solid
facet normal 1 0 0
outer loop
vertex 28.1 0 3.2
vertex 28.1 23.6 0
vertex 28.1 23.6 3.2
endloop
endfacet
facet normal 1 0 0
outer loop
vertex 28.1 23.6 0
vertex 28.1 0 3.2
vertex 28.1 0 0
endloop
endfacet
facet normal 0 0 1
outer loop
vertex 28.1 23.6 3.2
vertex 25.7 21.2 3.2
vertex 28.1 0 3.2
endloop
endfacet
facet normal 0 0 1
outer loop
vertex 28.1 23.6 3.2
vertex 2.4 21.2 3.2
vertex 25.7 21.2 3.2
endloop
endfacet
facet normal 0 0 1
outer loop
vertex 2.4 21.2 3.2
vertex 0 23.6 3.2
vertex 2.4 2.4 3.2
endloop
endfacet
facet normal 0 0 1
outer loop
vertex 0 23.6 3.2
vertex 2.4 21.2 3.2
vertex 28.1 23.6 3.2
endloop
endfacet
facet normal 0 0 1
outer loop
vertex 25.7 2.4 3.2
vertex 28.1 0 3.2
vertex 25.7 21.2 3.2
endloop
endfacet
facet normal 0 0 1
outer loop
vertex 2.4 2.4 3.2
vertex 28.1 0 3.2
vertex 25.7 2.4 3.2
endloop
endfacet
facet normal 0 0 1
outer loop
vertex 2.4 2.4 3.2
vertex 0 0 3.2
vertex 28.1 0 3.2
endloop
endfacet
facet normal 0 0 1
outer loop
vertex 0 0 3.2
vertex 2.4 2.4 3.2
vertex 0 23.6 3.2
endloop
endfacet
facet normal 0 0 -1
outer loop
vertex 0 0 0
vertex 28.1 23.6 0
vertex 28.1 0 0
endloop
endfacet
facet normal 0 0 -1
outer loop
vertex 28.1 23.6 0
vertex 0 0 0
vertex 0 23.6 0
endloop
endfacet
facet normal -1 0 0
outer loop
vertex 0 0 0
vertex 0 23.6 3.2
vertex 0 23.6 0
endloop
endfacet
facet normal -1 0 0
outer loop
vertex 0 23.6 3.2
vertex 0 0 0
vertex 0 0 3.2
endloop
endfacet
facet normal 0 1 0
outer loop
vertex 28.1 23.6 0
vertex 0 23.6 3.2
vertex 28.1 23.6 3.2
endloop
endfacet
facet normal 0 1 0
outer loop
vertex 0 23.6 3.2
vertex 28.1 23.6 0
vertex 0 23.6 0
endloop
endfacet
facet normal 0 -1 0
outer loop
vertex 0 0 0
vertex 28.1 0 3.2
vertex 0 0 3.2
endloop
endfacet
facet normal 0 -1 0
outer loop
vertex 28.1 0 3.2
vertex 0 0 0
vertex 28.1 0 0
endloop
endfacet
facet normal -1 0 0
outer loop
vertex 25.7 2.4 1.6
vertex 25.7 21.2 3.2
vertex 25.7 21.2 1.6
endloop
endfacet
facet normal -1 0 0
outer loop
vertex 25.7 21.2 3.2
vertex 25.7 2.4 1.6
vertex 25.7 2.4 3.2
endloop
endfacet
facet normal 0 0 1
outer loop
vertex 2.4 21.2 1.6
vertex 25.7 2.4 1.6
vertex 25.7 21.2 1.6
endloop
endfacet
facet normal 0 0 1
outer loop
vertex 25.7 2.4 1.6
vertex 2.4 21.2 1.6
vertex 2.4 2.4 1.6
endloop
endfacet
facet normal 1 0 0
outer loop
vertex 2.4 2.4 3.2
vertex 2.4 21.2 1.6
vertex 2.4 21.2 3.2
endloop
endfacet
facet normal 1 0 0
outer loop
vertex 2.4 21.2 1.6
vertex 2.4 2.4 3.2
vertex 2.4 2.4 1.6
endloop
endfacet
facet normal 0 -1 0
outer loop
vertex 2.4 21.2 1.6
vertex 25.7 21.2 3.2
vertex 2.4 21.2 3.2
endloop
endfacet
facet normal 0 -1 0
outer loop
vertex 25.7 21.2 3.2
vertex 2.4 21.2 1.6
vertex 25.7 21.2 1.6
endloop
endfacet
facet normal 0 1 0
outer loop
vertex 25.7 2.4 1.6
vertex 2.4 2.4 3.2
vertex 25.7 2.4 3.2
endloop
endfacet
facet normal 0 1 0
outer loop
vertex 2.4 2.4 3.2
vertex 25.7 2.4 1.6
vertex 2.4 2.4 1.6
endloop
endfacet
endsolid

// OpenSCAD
// MCU-pocket fit coupon — millimetres. Datasheet Super Mini class envelope.
mcu_length_mm = 22.5;
mcu_width_mm = 18.0;
mcu_pocket_clearance_mm = 0.4;
coupon_wall_mm = 2.4;
coupon_z_mm = 3.2;

difference() {
  cube([
    mcu_length_mm + 2 * mcu_pocket_clearance_mm + 2 * coupon_wall_mm,
    mcu_width_mm + 2 * mcu_pocket_clearance_mm + 2 * coupon_wall_mm,
    coupon_z_mm
  ]);
  translate([coupon_wall_mm, coupon_wall_mm, coupon_z_mm / 2])
    cube([
      mcu_length_mm + 2 * mcu_pocket_clearance_mm,
      mcu_width_mm + 2 * mcu_pocket_clearance_mm,
      coupon_z_mm
    ]);
}
